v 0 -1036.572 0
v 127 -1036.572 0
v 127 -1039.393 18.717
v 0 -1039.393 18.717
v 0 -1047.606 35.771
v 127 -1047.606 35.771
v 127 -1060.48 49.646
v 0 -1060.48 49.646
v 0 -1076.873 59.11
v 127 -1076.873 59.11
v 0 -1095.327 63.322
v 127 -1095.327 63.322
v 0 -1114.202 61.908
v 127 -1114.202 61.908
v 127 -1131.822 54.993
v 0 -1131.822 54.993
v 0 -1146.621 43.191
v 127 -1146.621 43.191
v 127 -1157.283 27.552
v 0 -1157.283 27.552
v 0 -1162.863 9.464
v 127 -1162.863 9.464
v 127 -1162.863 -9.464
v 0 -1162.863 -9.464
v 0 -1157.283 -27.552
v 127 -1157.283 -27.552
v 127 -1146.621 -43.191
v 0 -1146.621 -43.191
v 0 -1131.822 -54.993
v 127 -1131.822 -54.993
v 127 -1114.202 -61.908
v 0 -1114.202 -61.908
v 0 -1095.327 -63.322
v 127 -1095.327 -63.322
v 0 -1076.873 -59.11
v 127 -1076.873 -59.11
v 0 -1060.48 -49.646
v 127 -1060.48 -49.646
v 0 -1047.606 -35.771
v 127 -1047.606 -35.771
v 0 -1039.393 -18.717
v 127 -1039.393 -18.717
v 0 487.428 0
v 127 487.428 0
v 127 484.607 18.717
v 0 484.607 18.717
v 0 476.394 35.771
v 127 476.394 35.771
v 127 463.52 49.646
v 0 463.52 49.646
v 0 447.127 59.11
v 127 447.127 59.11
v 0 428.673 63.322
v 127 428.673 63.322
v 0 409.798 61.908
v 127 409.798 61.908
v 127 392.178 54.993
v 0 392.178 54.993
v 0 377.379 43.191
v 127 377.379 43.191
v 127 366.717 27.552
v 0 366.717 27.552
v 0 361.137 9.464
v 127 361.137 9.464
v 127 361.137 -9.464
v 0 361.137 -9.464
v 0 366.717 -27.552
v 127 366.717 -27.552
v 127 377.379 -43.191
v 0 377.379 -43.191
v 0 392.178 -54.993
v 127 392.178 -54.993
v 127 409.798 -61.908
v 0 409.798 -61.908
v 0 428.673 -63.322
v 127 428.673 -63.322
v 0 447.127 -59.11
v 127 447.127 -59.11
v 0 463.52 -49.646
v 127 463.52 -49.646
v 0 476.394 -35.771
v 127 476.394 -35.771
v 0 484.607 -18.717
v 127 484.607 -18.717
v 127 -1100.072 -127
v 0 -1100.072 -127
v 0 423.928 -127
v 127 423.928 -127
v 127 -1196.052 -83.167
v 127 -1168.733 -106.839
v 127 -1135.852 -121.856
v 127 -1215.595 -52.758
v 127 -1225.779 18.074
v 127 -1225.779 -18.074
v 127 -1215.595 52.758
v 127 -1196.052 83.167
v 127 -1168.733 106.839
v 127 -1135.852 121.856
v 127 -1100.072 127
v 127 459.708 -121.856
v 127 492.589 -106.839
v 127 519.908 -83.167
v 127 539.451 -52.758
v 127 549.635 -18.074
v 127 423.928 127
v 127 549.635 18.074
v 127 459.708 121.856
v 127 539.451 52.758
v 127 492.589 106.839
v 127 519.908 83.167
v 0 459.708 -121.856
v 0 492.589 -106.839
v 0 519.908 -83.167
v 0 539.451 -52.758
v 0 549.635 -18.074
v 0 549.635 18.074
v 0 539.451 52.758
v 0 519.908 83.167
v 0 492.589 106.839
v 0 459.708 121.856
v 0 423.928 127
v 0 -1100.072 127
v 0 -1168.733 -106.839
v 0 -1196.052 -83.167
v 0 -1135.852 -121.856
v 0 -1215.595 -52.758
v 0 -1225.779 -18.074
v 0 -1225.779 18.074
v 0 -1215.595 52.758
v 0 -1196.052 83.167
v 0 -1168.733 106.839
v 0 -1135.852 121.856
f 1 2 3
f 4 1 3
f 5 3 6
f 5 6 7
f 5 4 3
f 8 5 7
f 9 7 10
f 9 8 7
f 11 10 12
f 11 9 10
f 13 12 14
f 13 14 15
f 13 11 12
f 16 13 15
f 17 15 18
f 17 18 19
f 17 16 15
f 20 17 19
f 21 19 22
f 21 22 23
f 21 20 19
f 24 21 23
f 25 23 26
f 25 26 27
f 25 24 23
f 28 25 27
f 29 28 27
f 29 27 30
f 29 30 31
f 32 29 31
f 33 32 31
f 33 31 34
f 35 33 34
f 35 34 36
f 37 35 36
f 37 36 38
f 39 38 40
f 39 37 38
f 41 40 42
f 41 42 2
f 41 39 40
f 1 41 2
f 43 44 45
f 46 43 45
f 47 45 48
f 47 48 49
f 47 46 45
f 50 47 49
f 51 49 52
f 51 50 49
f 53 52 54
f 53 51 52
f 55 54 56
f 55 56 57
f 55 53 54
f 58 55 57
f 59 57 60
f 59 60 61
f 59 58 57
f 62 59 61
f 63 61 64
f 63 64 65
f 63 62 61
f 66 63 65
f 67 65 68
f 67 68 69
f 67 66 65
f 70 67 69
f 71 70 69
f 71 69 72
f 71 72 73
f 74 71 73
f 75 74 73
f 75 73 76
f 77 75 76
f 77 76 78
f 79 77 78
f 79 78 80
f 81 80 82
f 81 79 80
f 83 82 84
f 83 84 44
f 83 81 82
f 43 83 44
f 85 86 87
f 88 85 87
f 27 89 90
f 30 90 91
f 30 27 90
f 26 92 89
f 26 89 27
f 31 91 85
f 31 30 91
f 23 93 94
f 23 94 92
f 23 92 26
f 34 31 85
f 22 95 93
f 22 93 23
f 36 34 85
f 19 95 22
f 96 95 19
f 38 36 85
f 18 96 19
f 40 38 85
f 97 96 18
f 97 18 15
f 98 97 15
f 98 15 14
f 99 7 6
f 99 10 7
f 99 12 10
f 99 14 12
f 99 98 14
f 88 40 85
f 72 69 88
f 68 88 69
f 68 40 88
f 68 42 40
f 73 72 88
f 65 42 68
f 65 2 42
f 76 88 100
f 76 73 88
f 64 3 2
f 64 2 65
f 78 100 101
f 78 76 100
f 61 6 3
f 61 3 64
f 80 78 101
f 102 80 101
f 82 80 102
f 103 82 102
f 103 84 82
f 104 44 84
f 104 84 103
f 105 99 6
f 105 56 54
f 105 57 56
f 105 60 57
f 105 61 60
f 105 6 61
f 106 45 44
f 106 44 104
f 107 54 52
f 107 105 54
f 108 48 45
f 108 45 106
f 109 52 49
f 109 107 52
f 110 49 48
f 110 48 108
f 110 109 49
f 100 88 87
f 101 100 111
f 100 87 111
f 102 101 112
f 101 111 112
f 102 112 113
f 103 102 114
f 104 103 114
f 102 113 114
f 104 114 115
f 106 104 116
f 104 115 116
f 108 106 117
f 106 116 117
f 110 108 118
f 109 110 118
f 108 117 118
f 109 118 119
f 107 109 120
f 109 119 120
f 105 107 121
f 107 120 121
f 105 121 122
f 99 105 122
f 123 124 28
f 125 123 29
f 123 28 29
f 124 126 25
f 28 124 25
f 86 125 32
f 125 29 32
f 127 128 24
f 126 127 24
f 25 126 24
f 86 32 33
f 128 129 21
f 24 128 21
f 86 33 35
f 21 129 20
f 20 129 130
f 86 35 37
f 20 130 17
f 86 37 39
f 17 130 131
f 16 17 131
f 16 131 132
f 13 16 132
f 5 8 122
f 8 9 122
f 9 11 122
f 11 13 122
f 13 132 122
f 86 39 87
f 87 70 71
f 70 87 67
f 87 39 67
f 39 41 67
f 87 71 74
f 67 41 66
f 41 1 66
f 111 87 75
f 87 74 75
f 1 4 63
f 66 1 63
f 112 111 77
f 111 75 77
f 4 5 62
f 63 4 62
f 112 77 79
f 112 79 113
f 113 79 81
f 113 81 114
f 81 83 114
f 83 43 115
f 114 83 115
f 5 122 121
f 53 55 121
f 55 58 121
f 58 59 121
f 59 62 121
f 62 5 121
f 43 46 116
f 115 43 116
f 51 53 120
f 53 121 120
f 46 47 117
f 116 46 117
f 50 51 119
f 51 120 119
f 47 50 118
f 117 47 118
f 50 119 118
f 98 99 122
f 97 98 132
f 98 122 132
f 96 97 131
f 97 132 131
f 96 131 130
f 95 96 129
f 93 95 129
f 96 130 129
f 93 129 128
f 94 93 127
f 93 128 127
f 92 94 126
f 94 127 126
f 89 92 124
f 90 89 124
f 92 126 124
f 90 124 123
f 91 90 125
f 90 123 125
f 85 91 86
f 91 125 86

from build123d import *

# Parameters (mm, degrees)
F0_R     = 63.5
F1_DEPTH = 127


with BuildPart() as f1:
    # F0 (on Right) → F1 (new body)
    with BuildSketch(Plane.YZ):
        with BuildLine():
            Line((423.9281, 127), (-1100.0719, 127))
            ThreePointArc((-1100.0719, 127), (-1227.0719, 0), (-1100.0719, -127))
            Line((-1100.0719, -127), (423.9281, -127))
            ThreePointArc((423.9281, -127), (550.9281, 0), (423.9281, 127))
        make_face()
        with Locations((-1100.0719, 0)):
            Circle(F0_R, mode=Mode.SUBTRACT)
        with Locations((423.9281, 0)):
            Circle(F0_R, mode=Mode.SUBTRACT)
    extrude(amount=F1_DEPTH)


solid = f1.part
